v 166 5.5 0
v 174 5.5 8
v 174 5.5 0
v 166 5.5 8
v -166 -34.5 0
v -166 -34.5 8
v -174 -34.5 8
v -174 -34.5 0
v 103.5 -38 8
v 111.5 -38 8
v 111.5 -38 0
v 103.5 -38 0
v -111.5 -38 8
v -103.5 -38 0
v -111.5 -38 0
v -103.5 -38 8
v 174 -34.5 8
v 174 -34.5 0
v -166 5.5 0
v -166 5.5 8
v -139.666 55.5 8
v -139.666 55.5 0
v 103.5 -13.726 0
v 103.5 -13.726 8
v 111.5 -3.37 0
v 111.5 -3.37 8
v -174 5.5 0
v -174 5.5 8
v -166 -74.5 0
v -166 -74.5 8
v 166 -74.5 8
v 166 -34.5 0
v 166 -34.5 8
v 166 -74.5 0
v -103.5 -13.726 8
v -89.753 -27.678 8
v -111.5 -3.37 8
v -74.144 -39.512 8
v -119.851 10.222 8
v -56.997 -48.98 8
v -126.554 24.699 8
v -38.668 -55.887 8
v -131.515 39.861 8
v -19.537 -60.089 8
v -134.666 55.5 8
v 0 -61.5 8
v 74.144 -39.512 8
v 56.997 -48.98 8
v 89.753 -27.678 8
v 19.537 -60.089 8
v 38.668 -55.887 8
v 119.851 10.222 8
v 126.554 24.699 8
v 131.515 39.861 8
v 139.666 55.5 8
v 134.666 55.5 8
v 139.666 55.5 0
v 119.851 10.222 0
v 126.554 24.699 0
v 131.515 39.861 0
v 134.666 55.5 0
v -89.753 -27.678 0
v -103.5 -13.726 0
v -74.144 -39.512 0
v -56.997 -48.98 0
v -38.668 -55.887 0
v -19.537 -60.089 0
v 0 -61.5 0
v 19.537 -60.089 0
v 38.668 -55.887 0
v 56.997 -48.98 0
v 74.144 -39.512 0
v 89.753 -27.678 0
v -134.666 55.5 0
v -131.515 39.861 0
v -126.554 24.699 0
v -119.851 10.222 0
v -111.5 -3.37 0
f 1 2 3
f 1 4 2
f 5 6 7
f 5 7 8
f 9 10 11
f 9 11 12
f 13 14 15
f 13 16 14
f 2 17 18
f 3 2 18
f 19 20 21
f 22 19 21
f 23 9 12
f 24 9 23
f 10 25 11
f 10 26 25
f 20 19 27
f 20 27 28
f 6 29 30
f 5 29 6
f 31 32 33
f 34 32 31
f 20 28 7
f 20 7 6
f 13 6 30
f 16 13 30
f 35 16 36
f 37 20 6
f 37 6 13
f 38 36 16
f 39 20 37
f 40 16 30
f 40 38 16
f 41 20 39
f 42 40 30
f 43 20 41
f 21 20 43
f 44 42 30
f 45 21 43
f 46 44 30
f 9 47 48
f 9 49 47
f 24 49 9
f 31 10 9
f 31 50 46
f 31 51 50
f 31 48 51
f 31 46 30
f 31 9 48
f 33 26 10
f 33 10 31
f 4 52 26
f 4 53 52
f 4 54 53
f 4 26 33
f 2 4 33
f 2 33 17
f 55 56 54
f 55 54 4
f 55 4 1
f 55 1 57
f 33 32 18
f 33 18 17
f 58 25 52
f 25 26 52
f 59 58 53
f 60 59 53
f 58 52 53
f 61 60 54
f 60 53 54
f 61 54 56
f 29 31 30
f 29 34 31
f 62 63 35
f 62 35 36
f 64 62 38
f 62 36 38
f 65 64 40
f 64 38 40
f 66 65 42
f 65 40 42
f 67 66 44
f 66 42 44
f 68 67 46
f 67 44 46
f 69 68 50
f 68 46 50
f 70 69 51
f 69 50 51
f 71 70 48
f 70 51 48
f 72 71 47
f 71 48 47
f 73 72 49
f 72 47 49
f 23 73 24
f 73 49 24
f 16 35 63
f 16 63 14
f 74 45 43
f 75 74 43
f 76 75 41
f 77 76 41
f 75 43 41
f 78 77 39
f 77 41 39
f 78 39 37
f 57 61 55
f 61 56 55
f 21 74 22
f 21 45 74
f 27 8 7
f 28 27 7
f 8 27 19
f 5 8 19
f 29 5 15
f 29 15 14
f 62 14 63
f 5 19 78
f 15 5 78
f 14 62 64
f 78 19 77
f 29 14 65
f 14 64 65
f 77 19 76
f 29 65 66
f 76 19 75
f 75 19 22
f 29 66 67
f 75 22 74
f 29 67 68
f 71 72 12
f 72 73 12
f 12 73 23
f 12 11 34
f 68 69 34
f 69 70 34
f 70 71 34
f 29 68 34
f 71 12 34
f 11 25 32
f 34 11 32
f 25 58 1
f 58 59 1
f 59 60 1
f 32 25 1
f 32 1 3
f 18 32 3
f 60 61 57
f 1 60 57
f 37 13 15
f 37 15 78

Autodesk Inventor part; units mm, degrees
ref_plane "YZ Plane" through (0, 0, 0) normal (1, 0, 0) x (0, 1, 0)
ref_plane "XZ Plane" through (0, 0, 0) normal (0, 1, 0) x (-1, 0, 0)
ref_plane "XY Plane" through (0, 0, 0) normal (0, 0, 1) x (1, 0, 0)
sketch "Эскиз1" plane through (0, 0, 0) normal (0, 0, 1) x (1, 0, 0)
  line L0 (-166, 74.5) -> (166, 74.5)
  line L1 (166, 74.5) -> (166, -74.5)
  line L2 (166, -74.5) -> (-166, -74.5)
  line L3 (-166, -74.5) -> (-166, 74.5)
  point P0 (0, 0)
  dimension "d0" = 332
  dimension "d1" = 149
  dimension "d3" = 166
  dimension "d4" = 74.5
extrude "Выдавливание1" add sketch "Эскиз1" along normal blind 8
sketch "Эскиз2" plane through (0, 0, 8) normal (0, 0, 1) x (1, 0, 0)
  line L0 (166, 74.5) -> (-166, 74.5) projected
  line L1 (-166, -74.5) -> (166, -74.5) projected
  circle A0 centre (0, 74.5) radius 136
  point P0 (0, 0)
  point P1 (-136, 74.5)
  point P2 (136, 74.5)
  dimension "d8" = 272
extrude "Выдавливание2" cut sketch "Эскиз2" against normal through all contours A0 L0 picked at (19.0214, 16.0372)
sketch "Эскиз3" plane through (0, 0, 8) normal (0, 0, 1) x (1, 0, 0)
  line L0 (103.5, -3.3701) -> (111.5, -3.3701)
  line L1 (111.5, -3.3701) -> (111.5, -38)
  line L2 (111.5, -38) -> (103.5, -38)
  line L3 (103.5, -38) -> (103.5, -3.3701)
  line L4 (-111.5, -3.3701) -> (-103.5, -3.3701)
  line L5 (-103.5, -3.3701) -> (-103.5, -38)
  line L6 (-103.5, -38) -> (-111.5, -38)
  line L7 (-111.5, -38) -> (-111.5, -3.3701)
  line L8 (166, -74.5) -> (166, 74.5) projected
  line L9 (-166, -74.5) -> (166, -74.5) projected
  line L10 (-166, 74.5) -> (-166, -74.5) projected
  arc A0 (-136, 74.5) -> (136, 74.5) centre (0, 74.5) ccw projected
  point P0 (0, 0)
  dimension "d11" = 54.5
  dimension "d12" = 36.5
  dimension "d13" = 54.5
  dimension "d14" = 36.5
  dimension "d15" = 8
  dimension "d16" = 8
extrude "Выдавливание3" cut sketch "Эскиз3" against normal through all
sketch "Эскиз4" plane through (-166, -74.5, 0) normal (-1, 0, 0) x (0, 0, 1)
  line L0 (0, 80) -> (8, 80)
  line L1 (8, 80) -> (8, 40)
  line L2 (8, 40) -> (0, 40)
  line L3 (0, 40) -> (0, 80)
  line L4 (0, 0) -> (8, 0) projected
  line L5 (0, 149) -> (0, 0) projected
  point P0 (0, 74.5)
  dimension "d19" = 40
  dimension "d20" = 40
  dimension "d21" = 8
  dimension "d22" = 0
extrude "Выдавливание4" add sketch "Эскиз4" along normal blind 8
sketch "Эскиз5" plane through (166, -74.5, 0) normal (1, 0, 0) x (0, 0, -1)
  line L0 (-8, 80) -> (0, 80)
  line L1 (0, 80) -> (0, 40)
  line L2 (0, 40) -> (-8, 40)
  line L3 (-8, 40) -> (-8, 80)
  line L4 (0, 0) -> (-8, 0) projected
  line L5 (-8, 0) -> (-8, 149) projected
  point P0 (0, 74.5)
  dimension "d25" = 40
  dimension "d26" = 40
  dimension "d27" = 0
  dimension "d28" = 8
extrude "Выдавливание5" add sketch "Эскиз5" along normal blind 8
sketch "Эскиз6" plane through (0, 0, 8) normal (0, 0, 1) x (1, 0, 0)
  line L0 (-136, 74.5) -> (-166, 74.5) projected
  line L1 (-166, 74.5) -> (-134.6663, 74.5)
  line L2 (-134.6663, 74.5) -> (-134.6663, 55.5)
  line L3 (-134.6663, 55.5) -> (-166, 55.5)
  line L4 (-166, 55.5) -> (-166, 74.5)
  line L5 (-166, 5.5) -> (-174, 5.5) projected
  arc A0 (-136, 74.5) -> (-111.5, -3.3701) centre (0, 74.5) ccw projected
  line L6 (166, 74.5) -> (136, 74.5) projected
  arc A1 (111.5, -3.3701) -> (136, 74.5) centre (0, 74.5) ccw projected
  line L7 (166, 74.5) -> (134.6663, 74.5)
  line L8 (134.6663, 74.5) -> (134.6663, 55.5)
  line L9 (134.6663, 55.5) -> (166, 55.5)
  line L10 (166, 55.5) -> (166, 74.5)
  line L11 (166, 5.5) -> (174, 5.5) projected
  point P0 (0, 0)
  dimension "d31" = 50
  dimension "d34" = 50
extrude "Выдавливание6" cut sketch "Эскиз6" against normal through all contours A0 L3 L4 L0 | L10 L9 A1 L6
sketch "Эскиз7" plane through (0, 0, 8) normal (0, 0, 1) x (1, 0, 0)
  line L0 (-166, 55.5) -> (-166, 5.5) projected
  line L1 (-166, 55.5) -> (-134.6663, 55.5) projected
  line L2 (-166, 5.5) -> (-139.6663, 55.5)
  line L3 (-139.6663, 55.5) -> (-160.2816, 66.3576)
  line L4 (-160.2816, 66.3576) -> (-186.6153, 16.3576)
  line L5 (-186.6153, 16.3576) -> (-166, 5.5)
  line L6 (166, 5.5) -> (166, 55.5) projected
  line L7 (166, 5.5) -> (139.6663, 55.5)
  line L8 (139.6663, 55.5) -> (160.2816, 66.3576)
  line L9 (160.2816, 66.3576) -> (186.6153, 16.3576)
  line L10 (186.6153, 16.3576) -> (166, 5.5)
  line L11 (166, 55.5) -> (134.6663, 55.5) projected
  line L12 (139.6663, 55.5) -> (134.6663, 55.5)
  arc A0 (-134.6663, 55.5) -> (-111.5, -3.3701) centre (0, 74.5) ccw projected
  line L13 (-139.6663, 55.5) -> (-134.6663, 55.5)
  point P0 (0, 0)
  dimension "d35" = 5
  dimension "d36" = 5
extrude "Выдавливание7" cut sketch "Эскиз7" against normal through all contours L1 L2 L0 | L7 L11 L6
properties part number "myDno"
